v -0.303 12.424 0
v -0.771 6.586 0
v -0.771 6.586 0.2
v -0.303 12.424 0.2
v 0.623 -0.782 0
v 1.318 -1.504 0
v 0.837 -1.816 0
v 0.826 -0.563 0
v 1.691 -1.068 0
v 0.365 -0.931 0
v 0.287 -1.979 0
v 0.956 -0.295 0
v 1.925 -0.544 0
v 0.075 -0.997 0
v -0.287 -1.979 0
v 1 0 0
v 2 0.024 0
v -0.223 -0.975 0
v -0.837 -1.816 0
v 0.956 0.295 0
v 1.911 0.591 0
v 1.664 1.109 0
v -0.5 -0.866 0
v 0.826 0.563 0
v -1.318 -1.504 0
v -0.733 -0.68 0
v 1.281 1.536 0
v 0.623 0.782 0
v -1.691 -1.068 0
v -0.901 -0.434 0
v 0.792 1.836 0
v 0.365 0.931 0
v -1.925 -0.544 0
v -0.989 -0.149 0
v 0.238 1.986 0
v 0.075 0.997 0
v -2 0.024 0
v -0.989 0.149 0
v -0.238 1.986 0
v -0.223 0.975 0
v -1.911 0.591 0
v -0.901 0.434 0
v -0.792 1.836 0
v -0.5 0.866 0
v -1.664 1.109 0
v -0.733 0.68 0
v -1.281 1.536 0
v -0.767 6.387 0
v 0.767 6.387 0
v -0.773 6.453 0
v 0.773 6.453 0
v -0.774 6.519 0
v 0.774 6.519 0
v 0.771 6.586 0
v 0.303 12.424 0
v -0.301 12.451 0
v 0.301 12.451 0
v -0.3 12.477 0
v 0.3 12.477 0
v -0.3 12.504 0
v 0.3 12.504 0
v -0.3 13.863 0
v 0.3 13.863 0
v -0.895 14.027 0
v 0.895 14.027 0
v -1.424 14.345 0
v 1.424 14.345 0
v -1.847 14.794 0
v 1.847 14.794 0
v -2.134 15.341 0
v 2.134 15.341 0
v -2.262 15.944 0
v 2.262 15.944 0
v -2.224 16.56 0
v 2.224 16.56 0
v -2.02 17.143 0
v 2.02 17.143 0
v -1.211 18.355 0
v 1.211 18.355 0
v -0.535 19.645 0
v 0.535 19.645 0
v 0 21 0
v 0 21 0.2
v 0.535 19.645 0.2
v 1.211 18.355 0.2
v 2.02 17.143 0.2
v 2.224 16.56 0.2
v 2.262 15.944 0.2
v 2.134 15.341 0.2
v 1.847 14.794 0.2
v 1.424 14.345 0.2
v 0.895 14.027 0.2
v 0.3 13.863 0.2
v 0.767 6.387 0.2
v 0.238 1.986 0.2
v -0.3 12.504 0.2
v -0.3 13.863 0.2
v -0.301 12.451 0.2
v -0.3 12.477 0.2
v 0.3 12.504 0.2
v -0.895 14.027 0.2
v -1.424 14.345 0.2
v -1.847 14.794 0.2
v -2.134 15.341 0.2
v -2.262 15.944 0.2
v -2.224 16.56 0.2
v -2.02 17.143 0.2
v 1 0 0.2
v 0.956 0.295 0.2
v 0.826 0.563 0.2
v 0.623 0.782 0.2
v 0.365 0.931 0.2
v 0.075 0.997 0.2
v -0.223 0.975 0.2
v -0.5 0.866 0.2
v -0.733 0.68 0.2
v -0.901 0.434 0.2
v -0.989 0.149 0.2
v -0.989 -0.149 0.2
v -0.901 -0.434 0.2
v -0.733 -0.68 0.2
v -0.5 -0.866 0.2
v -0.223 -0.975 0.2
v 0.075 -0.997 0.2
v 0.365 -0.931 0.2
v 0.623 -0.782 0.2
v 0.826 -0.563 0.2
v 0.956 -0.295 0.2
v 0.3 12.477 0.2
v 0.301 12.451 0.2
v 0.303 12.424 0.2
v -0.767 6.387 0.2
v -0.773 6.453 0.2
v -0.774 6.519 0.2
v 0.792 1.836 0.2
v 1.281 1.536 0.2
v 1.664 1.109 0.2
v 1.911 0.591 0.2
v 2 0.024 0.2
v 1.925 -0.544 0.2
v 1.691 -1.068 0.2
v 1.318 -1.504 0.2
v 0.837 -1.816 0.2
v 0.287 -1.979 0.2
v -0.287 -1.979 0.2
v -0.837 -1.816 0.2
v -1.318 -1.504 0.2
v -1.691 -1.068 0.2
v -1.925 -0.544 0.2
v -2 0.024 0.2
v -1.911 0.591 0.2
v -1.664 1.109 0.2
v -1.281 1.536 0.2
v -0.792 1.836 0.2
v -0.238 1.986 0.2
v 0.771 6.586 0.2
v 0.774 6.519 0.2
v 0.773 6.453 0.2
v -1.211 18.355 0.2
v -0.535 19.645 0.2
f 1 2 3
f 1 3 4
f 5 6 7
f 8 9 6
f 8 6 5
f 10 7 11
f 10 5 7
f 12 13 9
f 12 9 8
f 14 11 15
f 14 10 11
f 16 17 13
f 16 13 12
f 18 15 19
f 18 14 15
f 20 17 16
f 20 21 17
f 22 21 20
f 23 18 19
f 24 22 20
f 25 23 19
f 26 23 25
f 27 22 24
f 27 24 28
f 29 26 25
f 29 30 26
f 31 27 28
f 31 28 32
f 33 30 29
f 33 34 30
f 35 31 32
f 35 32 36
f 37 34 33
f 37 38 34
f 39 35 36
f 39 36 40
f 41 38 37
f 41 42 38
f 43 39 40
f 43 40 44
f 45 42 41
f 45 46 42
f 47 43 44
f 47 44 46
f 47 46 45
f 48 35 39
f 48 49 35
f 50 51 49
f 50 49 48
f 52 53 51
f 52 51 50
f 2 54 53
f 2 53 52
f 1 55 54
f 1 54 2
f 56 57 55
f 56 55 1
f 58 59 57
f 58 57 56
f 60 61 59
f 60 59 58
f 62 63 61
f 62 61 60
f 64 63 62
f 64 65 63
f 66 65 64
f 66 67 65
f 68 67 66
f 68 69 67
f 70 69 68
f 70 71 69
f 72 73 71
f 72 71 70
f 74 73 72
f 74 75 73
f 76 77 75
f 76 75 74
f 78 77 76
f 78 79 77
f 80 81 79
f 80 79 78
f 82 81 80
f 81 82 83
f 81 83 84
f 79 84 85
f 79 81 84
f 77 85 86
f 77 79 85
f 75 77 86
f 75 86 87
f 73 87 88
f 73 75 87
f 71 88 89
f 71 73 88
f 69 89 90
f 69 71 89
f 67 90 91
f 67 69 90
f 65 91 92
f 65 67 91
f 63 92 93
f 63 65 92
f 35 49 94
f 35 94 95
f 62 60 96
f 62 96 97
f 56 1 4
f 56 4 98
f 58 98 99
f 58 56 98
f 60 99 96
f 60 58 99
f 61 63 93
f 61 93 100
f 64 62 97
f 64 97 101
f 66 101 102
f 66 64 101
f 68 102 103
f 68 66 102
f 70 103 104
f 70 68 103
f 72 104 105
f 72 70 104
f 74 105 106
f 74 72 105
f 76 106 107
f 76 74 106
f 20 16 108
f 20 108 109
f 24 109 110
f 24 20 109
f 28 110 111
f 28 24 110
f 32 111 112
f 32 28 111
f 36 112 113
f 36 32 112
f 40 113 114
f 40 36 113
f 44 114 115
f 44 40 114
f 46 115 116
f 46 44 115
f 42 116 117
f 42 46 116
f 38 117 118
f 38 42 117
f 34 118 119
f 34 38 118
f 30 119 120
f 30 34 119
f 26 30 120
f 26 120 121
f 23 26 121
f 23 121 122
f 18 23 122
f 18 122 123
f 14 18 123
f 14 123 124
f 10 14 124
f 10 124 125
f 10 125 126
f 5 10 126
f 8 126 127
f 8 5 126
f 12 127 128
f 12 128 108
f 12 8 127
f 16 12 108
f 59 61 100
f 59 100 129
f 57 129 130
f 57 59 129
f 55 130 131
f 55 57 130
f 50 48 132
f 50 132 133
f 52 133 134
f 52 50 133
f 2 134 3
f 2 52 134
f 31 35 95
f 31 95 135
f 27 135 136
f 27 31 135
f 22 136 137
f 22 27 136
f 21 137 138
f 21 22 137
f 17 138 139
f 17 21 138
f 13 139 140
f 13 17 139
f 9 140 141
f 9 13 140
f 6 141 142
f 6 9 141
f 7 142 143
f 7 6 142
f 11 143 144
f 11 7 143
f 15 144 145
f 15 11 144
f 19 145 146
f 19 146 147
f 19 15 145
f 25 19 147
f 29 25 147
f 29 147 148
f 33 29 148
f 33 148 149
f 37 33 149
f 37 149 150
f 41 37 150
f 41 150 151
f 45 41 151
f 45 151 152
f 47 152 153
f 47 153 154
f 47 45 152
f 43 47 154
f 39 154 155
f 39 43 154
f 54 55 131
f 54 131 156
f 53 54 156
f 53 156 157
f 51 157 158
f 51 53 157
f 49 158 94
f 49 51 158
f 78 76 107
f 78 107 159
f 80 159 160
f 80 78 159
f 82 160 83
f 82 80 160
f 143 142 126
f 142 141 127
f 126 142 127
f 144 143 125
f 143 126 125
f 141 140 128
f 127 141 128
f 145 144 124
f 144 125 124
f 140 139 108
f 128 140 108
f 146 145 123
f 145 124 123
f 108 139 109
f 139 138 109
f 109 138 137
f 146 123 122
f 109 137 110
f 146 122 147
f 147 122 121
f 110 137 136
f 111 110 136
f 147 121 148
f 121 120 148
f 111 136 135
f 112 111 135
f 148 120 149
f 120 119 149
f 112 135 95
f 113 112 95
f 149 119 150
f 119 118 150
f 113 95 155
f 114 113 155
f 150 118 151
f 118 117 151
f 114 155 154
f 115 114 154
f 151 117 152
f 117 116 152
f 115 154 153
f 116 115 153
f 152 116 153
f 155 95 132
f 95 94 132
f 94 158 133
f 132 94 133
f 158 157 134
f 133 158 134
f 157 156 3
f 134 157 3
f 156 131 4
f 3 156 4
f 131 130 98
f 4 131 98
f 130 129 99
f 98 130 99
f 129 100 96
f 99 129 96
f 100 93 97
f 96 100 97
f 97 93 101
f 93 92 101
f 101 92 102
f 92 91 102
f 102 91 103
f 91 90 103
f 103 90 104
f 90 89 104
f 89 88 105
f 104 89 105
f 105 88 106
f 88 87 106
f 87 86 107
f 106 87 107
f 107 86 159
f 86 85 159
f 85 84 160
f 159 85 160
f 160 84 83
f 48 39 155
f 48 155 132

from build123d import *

# Parameters (mm, degrees)
SKETCH1_R           = 1
BOSS_EXTRUDE1_DEPTH = 0.2


with BuildPart() as part:
    # Sketch1 → Boss-Extrude1 (new body)
    with BuildSketch(Plane.XY):
        with BuildLine():
            Line((-0.238423982, 1.985737648), (-0.766818617, 6.386524482))
            ThreePointArc((-0.766818617, 6.386524482), (-0.773753956, 6.48594667), (-0.77075837, 6.585565427))
            Line((-0.77075837, 6.585565427), (-0.303191424, 12.423982653))
            ThreePointArc((-0.303191424, 12.423982653), (-0.300798174, 12.463865246), (-0.3, 12.503811607))
            Line((-0.3, 12.503811607), (-0.3, 13.862922443))
            ThreePointArc((-0.3, 13.862922443), (-2.008962857, 15.057847822), (-2.020381908, 17.143098483))
            ThreePointArc((-2.020381908, 17.143098483), (-0.856036284, 18.990797554), (0, 21))
            ThreePointArc((0, 21), (0.856036284, 18.990797554), (2.020381908, 17.143098483))
            ThreePointArc((2.020381908, 17.143098483), (2.008962857, 15.057847822), (0.3, 13.862922443))
            Line((0.3, 13.862922443), (0.3, 12.503811607))
            ThreePointArc((0.3, 12.503811607), (0.300798174, 12.463865246), (0.303191424, 12.423982653))
            Line((0.303191424, 12.423982653), (0.77075837, 6.585565427))
            ThreePointArc((0.77075837, 6.585565427), (0.773753956, 6.48594667), (0.766818617, 6.386524482))
            Line((0.766818617, 6.386524482), (0.238423982, 1.985737648))
            ThreePointArc((0.238423982, 1.985737648), (0, -2), (-0.238423982, 1.985737648))
        make_face()
        Circle(SKETCH1_R, mode=Mode.SUBTRACT)
    extrude(amount=BOSS_EXTRUDE1_DEPTH)


solid = part.part
